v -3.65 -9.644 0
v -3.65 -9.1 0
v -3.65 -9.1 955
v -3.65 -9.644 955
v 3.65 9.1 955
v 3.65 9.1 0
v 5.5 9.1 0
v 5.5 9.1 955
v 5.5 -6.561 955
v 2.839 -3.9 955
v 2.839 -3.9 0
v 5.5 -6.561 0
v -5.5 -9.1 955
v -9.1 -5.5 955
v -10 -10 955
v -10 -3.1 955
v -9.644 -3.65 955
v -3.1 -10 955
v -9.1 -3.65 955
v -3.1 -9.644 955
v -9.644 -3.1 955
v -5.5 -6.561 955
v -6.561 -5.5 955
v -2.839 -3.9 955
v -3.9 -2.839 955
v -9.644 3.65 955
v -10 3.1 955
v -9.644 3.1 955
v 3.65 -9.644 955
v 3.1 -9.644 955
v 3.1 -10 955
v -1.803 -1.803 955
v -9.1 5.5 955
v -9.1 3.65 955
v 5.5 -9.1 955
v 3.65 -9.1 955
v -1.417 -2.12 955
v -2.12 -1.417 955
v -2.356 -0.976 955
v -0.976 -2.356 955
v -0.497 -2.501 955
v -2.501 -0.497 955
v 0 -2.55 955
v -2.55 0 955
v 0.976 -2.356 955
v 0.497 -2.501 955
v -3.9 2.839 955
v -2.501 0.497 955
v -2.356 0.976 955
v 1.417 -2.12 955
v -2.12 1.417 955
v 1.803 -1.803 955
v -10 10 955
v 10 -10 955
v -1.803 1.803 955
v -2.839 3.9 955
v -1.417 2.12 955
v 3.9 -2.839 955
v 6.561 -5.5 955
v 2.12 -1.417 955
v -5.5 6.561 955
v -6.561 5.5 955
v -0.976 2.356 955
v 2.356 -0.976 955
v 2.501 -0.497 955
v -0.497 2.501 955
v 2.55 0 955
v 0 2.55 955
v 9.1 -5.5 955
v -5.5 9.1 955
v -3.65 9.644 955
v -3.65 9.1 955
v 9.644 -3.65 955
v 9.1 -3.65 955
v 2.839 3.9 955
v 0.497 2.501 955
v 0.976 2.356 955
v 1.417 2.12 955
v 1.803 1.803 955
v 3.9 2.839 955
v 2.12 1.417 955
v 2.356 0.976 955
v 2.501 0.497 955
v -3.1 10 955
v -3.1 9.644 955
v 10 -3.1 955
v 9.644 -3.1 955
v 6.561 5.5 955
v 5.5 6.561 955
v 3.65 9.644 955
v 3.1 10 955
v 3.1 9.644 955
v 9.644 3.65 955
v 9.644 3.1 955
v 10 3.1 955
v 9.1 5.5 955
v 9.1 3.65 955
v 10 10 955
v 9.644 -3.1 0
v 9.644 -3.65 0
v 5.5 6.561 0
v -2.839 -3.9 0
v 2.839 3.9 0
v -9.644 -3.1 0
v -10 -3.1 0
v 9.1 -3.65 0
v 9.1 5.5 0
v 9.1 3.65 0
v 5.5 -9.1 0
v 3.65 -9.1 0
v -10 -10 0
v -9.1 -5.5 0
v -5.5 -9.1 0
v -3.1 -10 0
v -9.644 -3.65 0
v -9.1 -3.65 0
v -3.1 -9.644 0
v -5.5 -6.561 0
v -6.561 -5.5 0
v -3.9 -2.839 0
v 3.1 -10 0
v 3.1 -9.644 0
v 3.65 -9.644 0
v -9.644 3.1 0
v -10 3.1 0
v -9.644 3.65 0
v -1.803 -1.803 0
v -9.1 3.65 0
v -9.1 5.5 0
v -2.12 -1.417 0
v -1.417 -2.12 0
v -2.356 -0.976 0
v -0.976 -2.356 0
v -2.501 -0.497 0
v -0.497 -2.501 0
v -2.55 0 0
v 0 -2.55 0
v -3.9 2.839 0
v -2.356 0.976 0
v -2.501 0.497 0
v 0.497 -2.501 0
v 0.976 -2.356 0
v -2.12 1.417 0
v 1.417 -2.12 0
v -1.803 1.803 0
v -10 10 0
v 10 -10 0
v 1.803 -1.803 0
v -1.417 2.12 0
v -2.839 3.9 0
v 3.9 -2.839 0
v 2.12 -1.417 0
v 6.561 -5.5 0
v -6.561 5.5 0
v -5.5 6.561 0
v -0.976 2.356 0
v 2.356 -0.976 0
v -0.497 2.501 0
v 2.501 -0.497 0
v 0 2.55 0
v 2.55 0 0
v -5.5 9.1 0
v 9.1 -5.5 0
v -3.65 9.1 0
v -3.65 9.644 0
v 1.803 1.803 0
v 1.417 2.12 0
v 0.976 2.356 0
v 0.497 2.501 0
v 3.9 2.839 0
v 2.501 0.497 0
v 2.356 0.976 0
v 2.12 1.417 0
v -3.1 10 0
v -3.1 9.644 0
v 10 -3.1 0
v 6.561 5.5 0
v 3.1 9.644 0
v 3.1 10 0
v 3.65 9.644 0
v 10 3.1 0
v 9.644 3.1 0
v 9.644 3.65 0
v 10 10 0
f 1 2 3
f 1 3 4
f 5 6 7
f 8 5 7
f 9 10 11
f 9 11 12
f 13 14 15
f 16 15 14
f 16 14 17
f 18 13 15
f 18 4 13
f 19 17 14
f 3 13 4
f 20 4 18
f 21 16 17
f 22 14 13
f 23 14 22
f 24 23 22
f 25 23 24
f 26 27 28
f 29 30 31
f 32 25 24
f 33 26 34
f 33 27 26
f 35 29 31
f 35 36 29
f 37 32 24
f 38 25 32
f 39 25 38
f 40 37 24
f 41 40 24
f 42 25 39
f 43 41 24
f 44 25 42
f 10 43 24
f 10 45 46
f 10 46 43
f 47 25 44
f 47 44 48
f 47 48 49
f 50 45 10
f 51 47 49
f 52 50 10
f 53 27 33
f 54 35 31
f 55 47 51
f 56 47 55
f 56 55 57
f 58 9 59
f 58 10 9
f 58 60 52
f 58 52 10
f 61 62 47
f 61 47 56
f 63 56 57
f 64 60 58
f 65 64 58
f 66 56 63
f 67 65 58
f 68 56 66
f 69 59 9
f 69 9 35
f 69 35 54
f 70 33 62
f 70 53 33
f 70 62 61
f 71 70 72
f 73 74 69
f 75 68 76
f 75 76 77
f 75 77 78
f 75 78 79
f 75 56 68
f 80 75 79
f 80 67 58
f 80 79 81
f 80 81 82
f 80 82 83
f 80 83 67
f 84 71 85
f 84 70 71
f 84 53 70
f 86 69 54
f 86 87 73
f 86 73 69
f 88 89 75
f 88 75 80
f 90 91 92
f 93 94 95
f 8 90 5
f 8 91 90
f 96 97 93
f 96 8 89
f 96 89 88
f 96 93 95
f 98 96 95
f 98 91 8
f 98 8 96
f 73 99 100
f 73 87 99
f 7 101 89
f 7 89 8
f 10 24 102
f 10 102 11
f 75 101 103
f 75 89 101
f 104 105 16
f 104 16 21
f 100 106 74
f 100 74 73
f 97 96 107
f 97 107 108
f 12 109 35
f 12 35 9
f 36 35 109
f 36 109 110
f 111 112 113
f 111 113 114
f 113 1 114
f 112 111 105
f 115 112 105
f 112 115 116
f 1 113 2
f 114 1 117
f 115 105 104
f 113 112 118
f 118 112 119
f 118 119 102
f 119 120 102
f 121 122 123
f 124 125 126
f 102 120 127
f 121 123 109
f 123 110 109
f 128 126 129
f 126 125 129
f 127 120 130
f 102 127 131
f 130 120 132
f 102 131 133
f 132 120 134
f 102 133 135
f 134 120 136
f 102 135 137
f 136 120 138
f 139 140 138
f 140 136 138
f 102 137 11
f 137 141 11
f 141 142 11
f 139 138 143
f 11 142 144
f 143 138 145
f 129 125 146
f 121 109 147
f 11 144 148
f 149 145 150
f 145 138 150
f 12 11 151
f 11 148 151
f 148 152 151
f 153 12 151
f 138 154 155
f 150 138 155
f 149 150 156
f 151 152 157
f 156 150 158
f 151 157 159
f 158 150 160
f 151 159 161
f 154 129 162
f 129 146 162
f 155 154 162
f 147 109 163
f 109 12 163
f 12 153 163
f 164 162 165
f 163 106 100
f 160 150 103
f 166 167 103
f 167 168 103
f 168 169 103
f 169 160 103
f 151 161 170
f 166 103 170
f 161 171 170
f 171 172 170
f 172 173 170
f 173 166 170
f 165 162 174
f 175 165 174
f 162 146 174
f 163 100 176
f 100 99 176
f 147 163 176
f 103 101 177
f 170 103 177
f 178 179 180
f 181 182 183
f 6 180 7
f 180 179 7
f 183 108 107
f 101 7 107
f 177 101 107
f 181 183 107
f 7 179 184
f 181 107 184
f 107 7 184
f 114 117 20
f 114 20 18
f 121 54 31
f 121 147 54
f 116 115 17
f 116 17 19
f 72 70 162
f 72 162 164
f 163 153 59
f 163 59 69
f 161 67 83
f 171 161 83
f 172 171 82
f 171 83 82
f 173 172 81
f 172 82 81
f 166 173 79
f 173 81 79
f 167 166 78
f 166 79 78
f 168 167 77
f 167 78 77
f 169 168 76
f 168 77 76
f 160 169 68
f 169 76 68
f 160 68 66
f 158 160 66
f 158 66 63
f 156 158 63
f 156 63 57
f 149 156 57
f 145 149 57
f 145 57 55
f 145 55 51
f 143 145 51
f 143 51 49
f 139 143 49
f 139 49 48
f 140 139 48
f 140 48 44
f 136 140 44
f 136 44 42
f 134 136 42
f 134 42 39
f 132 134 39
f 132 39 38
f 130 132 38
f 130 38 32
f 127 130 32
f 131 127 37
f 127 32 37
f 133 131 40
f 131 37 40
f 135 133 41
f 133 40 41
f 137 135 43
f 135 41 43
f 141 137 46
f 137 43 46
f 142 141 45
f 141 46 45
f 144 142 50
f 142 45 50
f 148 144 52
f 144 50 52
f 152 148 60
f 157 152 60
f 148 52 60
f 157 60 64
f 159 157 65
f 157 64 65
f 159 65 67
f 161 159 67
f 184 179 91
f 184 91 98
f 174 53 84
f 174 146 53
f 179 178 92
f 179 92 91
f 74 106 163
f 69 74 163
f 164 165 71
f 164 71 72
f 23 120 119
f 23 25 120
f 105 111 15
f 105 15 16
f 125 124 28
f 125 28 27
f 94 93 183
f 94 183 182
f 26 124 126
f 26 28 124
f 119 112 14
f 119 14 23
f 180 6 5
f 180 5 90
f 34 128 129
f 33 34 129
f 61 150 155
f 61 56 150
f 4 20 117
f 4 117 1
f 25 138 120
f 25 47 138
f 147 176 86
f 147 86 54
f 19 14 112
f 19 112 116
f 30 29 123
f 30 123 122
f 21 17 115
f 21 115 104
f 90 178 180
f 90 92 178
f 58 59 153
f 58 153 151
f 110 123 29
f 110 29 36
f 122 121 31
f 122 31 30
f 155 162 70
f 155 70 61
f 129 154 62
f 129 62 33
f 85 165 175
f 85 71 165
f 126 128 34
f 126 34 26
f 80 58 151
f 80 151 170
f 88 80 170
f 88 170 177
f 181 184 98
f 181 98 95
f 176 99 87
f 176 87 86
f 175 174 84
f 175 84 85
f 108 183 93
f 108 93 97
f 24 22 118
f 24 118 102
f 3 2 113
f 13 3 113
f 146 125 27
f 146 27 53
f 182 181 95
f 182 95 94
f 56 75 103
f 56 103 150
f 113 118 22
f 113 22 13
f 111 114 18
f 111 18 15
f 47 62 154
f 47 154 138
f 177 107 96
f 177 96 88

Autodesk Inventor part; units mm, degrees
ref_plane "YZ Plane" through (0, 0, 0) normal (1, 0, 0) x (0, 1, 0)
ref_plane "XZ Plane" through (0, 0, 0) normal (0, 1, 0) x (-1, 0, 0)
ref_plane "XY Plane" through (0, 0, 0) normal (0, 0, 1) x (1, 0, 0)
sketch "草图1" plane through (0, 0, 0) normal (0, 0, 1) x (1, 0, 0)
  line L0 (10, -10) -> (-10, -10)
  line L1 (-10, -10) -> (-10, 10)
  line L2 (-10, 10) -> (10, 10)
  line L3 (10, 10) -> (10, -10)
  line L4 (10, -10) -> (-10, 10) construction
  line L5 (-10, -10) -> (10, 10) construction
  point P0 (0, 0)
  dimension "d0" = 20
  dimension "d1" = 20
extrude "拉伸1" add sketch "草图1" along normal blind 955
sketch "草图2" plane through (0, 0, 955) normal (0, 0, 1) x (1, 0, 0)
  circle A0 centre (0, 0) radius 2.55
  line L0 (-11.0615, 0) -> (0, 0)
  line L1 (0, 0) -> (0, 11.55)
  line L2 (-10, 10) -> (-10, -10)
  line L3 (10, 10) -> (-10, 10)
  line L4 (0, 3.9) -> (-3.9, 3.9)
  line L5 (-3.9, 3.9) -> (-3.9, 0)
  line L6 (-10, 10) -> (0, 0)
  line L7 (0, 1.0607) -> (-8.9393, 10)
  line L8 (-1.0607, 0) -> (-10, 8.9393)
  line L9 (-10, 10) -> (-3.1, 10)
  line L10 (-10, 3.1) -> (-10, 10)
  line L11 (-10, 10) -> (-3.65, 10)
  line L12 (-10, 3.65) -> (-10, 10)
  line L13 (-5.5, 12.0125) -> (-5.5, 5.5)
  line L14 (-10, 10) -> (-5.5, 10)
  line L15 (-5.5, 10) -> (-5.5, 5.5)
  line L16 (-5.5, 5.5) -> (-10, 5.5)
  line L17 (-10, 5.5) -> (-10, 10)
  line L18 (-5.5, 9.1) -> (0, 9.1)
  line L19 (-3.65, 10) -> (-3.65, 9.1)
  line L20 (-3.1, 10) -> (-3.1, 9.1)
  line L21 (-3.65, 9.6441) -> (-3.1, 9.6441)
  point P0 (-3.1, 9.55)
  point P1 (-2.8393, 3.9)
  point P2 (0, 10)
  point P3 (-5.5, 6.5607)
  dimension "d4" = 5.1
  dimension "d5" = 6.1
  dimension "d6" = 1.5
  dimension "d7" = 5.5
  dimension "d8" = 0.9
  dimension "d9" = 3.1
  dimension "d10" = 3.65
extrude "拉伸2" cut sketch "草图2" against normal up to surface (955 mm away) contours A0 L0 L1 | L1 L7 A0 | A0 L8 L0 | L7 L1 L6 A0 | L4 L7 L13 L18 L1 | A0 L6 L0 L8 | L18 L20 L3 L1 | L18 L19 L21 L20
mirror "镜像1" about plane through (0, 10, 955) normal (-1, 0, 0) of "拉伸2"
pattern_circular "环形阵列1" count 4 over 360 about axis through (0, 0, 955) along (0, 0, -1) of "拉伸2", "镜像1"
properties part number "铝方管2020x"
